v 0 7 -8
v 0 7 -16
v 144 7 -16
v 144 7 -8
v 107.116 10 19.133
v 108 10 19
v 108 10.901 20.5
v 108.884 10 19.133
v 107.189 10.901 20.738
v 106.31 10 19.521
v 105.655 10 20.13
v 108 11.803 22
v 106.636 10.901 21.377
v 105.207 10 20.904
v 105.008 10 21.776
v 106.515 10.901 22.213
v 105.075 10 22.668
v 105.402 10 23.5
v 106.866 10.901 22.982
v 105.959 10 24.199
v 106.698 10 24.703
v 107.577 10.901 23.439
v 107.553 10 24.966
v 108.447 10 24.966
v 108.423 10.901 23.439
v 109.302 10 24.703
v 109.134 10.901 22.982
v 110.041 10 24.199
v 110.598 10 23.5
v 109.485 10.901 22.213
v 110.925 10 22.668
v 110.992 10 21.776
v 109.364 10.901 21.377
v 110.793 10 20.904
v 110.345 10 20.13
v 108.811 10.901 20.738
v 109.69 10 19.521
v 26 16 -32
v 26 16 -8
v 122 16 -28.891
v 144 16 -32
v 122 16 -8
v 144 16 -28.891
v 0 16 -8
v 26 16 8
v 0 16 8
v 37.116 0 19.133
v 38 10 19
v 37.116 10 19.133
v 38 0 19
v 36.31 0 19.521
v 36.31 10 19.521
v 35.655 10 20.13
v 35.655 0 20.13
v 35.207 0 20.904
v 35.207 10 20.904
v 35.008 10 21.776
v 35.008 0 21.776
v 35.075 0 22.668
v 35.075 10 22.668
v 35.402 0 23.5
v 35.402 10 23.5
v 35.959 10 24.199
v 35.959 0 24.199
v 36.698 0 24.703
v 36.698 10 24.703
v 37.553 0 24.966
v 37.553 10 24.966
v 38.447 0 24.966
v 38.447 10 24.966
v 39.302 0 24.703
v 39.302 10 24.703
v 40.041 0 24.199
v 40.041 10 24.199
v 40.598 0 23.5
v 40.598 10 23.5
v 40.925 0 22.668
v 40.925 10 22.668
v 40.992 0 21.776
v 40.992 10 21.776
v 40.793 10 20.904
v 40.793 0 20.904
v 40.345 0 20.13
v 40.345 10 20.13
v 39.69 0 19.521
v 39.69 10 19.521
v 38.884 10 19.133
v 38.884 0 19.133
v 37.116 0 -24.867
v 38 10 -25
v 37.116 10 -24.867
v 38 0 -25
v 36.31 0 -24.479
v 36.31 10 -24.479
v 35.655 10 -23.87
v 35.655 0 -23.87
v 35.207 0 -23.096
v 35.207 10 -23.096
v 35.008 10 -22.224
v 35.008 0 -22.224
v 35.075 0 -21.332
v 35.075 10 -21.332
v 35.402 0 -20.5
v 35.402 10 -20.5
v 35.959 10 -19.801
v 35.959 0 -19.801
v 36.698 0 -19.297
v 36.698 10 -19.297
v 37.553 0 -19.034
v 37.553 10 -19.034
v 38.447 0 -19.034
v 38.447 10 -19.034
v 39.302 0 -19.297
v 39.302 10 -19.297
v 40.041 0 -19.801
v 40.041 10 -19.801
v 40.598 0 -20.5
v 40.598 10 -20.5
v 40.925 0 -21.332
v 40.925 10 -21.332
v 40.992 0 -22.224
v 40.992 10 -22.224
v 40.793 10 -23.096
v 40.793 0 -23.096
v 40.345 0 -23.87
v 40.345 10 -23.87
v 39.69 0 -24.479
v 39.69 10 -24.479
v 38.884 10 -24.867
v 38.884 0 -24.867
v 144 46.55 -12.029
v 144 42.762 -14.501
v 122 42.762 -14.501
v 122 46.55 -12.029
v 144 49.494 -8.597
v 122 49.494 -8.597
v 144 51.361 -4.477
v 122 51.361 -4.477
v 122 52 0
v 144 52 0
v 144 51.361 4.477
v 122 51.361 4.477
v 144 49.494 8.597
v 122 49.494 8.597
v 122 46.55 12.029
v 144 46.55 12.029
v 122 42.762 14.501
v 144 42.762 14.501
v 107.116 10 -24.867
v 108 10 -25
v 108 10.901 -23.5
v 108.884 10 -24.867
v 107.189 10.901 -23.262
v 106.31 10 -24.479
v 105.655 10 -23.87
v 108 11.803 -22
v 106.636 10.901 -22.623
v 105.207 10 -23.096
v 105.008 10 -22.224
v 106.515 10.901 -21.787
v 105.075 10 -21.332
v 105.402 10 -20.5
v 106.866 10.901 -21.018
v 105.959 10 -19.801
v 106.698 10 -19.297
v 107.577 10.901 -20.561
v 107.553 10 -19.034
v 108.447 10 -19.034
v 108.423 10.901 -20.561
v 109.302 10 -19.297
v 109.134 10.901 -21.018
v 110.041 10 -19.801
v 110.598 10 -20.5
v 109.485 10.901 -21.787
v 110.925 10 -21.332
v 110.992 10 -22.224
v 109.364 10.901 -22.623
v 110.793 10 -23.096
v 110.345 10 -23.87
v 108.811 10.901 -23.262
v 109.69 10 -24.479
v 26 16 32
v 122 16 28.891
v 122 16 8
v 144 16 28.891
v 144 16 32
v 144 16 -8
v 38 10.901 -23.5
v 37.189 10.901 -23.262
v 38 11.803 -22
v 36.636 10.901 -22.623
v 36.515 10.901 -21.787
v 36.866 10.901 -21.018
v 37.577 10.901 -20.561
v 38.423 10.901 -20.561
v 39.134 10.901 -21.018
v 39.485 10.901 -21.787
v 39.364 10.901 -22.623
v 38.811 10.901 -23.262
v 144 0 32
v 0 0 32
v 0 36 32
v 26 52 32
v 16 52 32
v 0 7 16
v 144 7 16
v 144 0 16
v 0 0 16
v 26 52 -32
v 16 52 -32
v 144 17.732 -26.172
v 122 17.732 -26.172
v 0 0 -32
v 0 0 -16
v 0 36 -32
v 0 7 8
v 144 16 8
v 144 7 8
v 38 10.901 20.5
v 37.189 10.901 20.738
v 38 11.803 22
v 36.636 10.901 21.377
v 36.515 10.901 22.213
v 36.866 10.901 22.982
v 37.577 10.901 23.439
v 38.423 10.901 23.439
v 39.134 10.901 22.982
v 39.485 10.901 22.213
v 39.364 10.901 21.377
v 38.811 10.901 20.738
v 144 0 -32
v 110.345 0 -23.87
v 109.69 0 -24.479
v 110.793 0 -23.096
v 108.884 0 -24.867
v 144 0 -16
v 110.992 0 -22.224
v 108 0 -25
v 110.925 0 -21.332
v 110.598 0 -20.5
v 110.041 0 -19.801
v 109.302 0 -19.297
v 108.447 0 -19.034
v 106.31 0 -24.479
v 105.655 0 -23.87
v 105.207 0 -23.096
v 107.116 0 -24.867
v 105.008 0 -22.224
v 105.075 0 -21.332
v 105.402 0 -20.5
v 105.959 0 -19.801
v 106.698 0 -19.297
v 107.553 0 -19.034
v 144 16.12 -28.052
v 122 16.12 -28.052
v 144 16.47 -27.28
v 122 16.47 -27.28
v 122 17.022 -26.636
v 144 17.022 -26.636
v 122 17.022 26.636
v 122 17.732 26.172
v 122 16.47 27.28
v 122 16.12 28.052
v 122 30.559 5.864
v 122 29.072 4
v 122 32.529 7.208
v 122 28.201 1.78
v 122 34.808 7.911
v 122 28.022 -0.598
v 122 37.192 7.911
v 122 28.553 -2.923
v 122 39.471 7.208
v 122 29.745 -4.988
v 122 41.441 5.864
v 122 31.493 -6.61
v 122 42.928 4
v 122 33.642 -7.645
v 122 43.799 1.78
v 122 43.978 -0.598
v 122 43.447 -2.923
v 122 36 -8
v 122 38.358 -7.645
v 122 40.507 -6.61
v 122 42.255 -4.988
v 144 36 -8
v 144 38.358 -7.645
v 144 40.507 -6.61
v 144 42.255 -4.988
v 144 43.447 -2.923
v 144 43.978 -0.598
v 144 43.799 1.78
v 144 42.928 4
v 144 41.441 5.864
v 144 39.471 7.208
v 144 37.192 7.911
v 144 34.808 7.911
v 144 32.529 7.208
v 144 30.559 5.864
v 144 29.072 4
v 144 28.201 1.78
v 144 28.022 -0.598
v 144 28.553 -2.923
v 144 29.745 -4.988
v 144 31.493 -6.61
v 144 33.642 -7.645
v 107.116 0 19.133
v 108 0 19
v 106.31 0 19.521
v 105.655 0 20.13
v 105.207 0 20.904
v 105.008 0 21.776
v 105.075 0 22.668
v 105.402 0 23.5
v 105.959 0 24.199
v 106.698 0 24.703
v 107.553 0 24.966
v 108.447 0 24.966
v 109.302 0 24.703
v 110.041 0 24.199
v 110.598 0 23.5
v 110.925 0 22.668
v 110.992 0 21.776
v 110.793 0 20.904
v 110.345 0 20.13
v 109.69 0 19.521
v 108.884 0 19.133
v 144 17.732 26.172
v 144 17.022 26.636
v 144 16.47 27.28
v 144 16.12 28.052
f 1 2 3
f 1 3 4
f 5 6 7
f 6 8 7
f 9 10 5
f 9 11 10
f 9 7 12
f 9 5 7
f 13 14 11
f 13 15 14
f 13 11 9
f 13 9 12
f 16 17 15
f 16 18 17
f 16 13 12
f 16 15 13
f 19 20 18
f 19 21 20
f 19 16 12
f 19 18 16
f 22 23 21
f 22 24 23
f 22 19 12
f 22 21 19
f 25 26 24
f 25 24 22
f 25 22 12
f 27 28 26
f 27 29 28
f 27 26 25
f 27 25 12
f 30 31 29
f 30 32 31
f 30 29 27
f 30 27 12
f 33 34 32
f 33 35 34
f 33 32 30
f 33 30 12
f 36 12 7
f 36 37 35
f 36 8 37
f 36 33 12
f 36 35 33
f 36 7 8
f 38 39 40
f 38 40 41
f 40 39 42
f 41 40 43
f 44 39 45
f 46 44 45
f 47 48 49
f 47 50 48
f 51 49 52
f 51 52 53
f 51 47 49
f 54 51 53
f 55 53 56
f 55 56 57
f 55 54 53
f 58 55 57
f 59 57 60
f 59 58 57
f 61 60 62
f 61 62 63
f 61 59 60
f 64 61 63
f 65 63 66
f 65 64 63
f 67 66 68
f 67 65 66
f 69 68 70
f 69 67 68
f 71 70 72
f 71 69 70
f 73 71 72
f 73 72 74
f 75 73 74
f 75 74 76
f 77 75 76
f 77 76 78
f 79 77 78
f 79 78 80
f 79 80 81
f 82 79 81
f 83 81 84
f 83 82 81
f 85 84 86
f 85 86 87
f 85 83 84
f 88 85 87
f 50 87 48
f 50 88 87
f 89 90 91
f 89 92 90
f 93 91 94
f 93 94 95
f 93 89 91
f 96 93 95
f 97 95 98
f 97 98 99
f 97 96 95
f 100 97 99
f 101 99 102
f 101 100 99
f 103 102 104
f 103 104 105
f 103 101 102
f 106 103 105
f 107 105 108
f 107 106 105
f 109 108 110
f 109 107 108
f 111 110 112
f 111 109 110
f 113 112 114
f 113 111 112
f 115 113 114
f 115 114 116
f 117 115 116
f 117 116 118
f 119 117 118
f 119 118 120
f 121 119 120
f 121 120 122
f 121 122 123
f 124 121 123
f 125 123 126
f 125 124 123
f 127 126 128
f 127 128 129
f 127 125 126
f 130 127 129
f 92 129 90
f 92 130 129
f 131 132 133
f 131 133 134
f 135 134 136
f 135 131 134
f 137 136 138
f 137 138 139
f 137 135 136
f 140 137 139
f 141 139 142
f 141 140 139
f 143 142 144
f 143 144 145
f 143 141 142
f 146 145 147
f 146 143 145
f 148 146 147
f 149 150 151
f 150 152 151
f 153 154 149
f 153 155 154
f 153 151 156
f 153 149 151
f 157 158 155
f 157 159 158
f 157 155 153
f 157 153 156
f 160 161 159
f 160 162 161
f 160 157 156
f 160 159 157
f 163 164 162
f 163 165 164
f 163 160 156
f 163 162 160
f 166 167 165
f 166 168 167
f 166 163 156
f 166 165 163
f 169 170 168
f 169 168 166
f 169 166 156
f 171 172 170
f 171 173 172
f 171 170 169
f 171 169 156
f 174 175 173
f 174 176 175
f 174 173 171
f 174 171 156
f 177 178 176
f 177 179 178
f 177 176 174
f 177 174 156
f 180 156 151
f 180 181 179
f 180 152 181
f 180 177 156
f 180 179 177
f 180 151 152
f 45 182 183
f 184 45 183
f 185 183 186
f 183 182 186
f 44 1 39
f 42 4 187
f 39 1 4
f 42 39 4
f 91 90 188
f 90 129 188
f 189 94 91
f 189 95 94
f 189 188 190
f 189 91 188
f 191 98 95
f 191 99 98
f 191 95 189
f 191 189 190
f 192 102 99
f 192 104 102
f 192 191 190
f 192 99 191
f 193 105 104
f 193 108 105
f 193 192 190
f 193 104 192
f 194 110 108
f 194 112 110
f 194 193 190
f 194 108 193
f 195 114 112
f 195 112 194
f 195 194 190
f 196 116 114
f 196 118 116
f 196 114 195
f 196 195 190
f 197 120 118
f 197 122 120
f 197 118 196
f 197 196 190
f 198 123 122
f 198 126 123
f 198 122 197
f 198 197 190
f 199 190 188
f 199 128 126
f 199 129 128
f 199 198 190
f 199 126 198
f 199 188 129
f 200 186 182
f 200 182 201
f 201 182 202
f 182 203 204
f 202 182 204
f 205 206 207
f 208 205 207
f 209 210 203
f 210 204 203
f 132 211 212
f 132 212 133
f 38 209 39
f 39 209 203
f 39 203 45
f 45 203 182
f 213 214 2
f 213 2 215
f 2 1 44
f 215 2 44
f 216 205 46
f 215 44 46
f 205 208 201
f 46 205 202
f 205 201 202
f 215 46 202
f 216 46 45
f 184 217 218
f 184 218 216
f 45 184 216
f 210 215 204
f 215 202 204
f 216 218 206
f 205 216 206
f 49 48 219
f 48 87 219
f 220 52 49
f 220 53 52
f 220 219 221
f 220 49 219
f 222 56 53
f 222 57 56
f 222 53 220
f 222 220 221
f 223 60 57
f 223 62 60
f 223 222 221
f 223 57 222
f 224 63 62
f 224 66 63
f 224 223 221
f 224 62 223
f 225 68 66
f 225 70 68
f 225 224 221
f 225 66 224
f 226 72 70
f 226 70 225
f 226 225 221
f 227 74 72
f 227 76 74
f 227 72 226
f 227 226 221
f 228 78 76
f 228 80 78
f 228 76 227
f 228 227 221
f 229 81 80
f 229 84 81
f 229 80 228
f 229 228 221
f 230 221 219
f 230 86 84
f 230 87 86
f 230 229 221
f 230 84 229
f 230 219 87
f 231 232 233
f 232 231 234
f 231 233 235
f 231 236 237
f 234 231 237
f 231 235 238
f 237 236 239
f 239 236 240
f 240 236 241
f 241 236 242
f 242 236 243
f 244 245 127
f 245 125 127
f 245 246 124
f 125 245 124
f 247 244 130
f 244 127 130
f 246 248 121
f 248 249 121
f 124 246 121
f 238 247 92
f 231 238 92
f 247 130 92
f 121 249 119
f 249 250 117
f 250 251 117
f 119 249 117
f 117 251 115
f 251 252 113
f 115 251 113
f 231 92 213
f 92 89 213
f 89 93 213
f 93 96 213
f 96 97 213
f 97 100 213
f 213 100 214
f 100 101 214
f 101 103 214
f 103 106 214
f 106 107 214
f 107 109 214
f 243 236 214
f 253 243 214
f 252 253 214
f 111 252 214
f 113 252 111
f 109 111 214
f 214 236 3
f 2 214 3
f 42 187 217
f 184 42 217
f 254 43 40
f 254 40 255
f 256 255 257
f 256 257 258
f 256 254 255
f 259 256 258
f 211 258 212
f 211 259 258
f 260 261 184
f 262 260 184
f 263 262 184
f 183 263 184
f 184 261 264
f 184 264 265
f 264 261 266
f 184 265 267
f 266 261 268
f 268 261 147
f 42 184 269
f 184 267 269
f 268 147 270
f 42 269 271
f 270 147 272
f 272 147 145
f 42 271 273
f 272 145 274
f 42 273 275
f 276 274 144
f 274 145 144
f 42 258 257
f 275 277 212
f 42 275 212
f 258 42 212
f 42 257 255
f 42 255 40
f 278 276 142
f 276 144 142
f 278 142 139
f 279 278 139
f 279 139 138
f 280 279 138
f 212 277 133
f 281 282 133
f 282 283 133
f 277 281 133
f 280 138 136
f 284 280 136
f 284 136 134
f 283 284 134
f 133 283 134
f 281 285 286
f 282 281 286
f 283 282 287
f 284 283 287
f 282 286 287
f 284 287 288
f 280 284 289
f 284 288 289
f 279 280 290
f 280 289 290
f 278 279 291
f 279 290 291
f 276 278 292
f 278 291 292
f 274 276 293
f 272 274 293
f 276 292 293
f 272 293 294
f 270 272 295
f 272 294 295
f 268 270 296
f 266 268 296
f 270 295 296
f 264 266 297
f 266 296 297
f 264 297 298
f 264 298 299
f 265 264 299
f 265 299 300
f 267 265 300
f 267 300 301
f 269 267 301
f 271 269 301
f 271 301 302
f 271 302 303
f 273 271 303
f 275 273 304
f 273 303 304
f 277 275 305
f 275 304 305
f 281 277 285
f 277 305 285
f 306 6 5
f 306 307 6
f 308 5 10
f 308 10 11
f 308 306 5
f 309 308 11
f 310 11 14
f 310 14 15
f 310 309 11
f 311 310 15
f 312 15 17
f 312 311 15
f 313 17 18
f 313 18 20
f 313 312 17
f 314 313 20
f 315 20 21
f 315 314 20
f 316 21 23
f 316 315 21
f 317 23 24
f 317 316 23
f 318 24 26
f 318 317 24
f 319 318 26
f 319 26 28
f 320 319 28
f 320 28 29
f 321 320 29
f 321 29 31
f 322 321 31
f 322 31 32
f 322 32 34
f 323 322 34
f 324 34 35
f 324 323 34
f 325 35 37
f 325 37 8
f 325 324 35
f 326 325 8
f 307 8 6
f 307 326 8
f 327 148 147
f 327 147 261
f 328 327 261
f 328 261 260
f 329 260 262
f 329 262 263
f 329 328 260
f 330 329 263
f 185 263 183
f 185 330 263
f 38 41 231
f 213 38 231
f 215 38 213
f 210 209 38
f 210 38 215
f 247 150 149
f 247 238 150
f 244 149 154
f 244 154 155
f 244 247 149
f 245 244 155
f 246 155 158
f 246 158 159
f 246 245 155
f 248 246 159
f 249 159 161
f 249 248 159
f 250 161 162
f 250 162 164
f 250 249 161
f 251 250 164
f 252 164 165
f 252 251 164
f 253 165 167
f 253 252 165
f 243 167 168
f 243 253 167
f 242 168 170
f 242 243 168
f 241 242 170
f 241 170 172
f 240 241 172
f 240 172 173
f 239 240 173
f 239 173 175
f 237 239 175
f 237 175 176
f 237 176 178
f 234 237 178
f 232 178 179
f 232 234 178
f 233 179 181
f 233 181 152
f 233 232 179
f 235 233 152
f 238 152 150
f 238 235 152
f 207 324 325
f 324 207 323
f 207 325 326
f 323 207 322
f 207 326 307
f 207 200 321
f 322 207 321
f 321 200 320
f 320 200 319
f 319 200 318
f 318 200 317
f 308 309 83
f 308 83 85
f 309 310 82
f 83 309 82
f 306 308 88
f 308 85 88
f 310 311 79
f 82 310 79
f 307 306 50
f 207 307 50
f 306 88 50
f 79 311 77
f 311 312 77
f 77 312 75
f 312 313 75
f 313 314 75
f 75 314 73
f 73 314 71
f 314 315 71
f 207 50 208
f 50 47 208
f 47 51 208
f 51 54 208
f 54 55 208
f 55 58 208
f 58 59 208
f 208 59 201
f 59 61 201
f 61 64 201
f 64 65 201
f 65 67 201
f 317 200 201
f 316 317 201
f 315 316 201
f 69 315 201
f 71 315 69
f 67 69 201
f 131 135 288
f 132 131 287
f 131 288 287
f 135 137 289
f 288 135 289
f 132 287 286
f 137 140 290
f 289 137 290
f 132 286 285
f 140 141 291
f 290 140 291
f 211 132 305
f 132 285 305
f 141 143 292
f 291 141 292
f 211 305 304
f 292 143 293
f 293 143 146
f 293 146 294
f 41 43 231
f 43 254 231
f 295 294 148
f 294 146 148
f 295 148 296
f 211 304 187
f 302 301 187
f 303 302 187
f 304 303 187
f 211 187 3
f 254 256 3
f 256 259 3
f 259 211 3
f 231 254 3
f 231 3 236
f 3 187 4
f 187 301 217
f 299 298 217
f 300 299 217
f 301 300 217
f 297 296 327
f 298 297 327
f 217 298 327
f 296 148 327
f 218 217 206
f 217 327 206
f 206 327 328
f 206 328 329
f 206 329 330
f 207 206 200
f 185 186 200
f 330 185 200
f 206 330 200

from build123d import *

# Parameters (mm, degrees)
BOSS_EXTRUDE1_DEPTH  = 32
SKETCH3_R            = 8
BOSS_EXTRUDE2_DEPTH  = 22
CUT_EXTRUDE1_DEPTH   = 145
LPATTERN1_COUNT      = 2
LPATTERN1_PITCH      = 70
LPATTERN1_COUNT_DIR2 = 2
LPATTERN1_PITCH_DIR2 = 44


with BuildPart() as part:
    # Sketch1 → Boss-Extrude1 (new body, symmetric)
    with BuildSketch(Plane.XY):
        Polygon((0, 0), (0, 36), (16, 52), (26, 52), (26, 16), (144, 16), (144, 0), align=None)
    extrude(amount=BOSS_EXTRUDE1_DEPTH, both=True)

    # Sketch3 → Boss-Extrude2 (add)
    with BuildSketch(Plane(origin=(144, 0, 0), x_dir=(0, 0, -1), z_dir=(1, 0, 0))):
        with BuildLine():
            Line((-14.500924593, 42.761892188), (-26.172487288, 17.732145215))
            ThreePointArc((-26.172487288, 17.732145215), (-27.279511824, 16.469825663), (-28.891410649, 16))
            Line((-28.891410649, 16), (28.891410649, 16))
            ThreePointArc((28.891410649, 16), (27.279511824, 16.469825663), (26.172487288, 17.732145215))
            Line((26.172487288, 17.732145215), (14.500924593, 42.761892188))
            ThreePointArc((14.500924593, 42.761892188), (0, 52), (-14.500924593, 42.761892188))
        make_face()
        with Locations((0, 36)):
            Circle(SKETCH3_R, mode=Mode.SUBTRACT)
    extrude(amount=-BOSS_EXTRUDE2_DEPTH)

    # Sketch4 → Cut-Extrude1 (cut, through all)
    with BuildSketch(Plane(origin=(144, 0, 0), x_dir=(0, 0, -1), z_dir=(1, 0, 0))):
        Polygon((-16, 0), (16, 0), (16, 7), (8, 7), (8, 16), (-8, 16), (-8, 7), (-16, 7), align=None)
    extrude(amount=-CUT_EXTRUDE1_DEPTH, mode=Mode.SUBTRACT)

    # Sketch6 → Ø6.0mm Dowel Hole1 (revolve, cut)
    with BuildSketch(Plane(origin=(38, 0, 22), x_dir=(0, 0, -1), z_dir=(1, 0, 0))):
        Polygon((0, 0), (0, 11.802581857), (3, 10), (3, 0), align=None)
    f_6_0mm_dowel_hole1 = revolve(axis=Axis((38, -6.35, 22), (0, 1, 0)), mode=Mode.SUBTRACT)

    # LPattern1: 6.0mm Dowel Hole1 2 × 2
    with Locations(*[(i * LPATTERN1_PITCH, 0, -j * LPATTERN1_PITCH_DIR2) for i in range(LPATTERN1_COUNT) for j in range(LPATTERN1_COUNT_DIR2) if (i, j) != (0, 0)]):
        add(f_6_0mm_dowel_hole1, mode=Mode.SUBTRACT)


solid = part.part
